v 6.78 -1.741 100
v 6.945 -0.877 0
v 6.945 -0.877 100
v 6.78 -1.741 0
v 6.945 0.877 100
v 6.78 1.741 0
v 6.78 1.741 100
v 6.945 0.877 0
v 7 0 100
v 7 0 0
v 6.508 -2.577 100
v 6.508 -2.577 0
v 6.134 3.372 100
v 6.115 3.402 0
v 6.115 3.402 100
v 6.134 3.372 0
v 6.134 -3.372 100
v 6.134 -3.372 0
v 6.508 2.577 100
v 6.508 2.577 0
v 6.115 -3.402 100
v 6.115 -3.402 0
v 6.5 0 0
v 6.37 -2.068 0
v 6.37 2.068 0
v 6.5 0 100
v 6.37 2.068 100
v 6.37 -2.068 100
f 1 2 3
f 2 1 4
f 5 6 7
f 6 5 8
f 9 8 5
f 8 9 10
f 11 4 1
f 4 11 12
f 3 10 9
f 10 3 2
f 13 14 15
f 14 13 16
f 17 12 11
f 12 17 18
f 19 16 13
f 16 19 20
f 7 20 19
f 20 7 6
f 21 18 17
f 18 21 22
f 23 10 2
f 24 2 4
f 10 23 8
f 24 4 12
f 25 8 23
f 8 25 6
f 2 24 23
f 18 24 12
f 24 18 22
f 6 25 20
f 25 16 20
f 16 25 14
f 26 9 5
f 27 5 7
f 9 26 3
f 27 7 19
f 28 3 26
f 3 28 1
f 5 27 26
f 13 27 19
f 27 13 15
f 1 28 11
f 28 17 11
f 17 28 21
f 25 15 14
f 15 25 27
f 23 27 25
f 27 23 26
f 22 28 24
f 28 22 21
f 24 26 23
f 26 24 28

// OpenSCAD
$fn = 50;


difference() {
	union() {
		cylinder(h = 100, r = 7.0000000000);
		translate(v = [-13.0000000000, 0, 0]) {
			cylinder(h = 100, r = 7.0000000000);
		}
	}
	union() {
		cylinder(h = 100, r = 3.2500000000);
		cylinder(h = 100, r = 1.8000000000);
		cylinder(h = 100, r = 1.8000000000);
		cylinder(h = 100, r = 1.8000000000);
		translate(v = [-17.5000000000, 0, 0]) {
			hull() {
				translate(v = [-3.7500000000, 0.0000000000, 0]) {
					cylinder(h = 100, r = 10.5000000000);
				}
				translate(v = [3.7500000000, 0.0000000000, 0]) {
					cylinder(h = 100, r = 10.5000000000);
				}
				translate(v = [-3.7500000000, -0.0000000000, 0]) {
					cylinder(h = 100, r = 10.5000000000);
				}
				translate(v = [3.7500000000, -0.0000000000, 0]) {
					cylinder(h = 100, r = 10.5000000000);
				}
			}
		}
		translate(v = [-10.0000000000, 0, 0.0000000000]) {
			cylinder(h = 100, r = 16.5000000000);
		}
	}
}
